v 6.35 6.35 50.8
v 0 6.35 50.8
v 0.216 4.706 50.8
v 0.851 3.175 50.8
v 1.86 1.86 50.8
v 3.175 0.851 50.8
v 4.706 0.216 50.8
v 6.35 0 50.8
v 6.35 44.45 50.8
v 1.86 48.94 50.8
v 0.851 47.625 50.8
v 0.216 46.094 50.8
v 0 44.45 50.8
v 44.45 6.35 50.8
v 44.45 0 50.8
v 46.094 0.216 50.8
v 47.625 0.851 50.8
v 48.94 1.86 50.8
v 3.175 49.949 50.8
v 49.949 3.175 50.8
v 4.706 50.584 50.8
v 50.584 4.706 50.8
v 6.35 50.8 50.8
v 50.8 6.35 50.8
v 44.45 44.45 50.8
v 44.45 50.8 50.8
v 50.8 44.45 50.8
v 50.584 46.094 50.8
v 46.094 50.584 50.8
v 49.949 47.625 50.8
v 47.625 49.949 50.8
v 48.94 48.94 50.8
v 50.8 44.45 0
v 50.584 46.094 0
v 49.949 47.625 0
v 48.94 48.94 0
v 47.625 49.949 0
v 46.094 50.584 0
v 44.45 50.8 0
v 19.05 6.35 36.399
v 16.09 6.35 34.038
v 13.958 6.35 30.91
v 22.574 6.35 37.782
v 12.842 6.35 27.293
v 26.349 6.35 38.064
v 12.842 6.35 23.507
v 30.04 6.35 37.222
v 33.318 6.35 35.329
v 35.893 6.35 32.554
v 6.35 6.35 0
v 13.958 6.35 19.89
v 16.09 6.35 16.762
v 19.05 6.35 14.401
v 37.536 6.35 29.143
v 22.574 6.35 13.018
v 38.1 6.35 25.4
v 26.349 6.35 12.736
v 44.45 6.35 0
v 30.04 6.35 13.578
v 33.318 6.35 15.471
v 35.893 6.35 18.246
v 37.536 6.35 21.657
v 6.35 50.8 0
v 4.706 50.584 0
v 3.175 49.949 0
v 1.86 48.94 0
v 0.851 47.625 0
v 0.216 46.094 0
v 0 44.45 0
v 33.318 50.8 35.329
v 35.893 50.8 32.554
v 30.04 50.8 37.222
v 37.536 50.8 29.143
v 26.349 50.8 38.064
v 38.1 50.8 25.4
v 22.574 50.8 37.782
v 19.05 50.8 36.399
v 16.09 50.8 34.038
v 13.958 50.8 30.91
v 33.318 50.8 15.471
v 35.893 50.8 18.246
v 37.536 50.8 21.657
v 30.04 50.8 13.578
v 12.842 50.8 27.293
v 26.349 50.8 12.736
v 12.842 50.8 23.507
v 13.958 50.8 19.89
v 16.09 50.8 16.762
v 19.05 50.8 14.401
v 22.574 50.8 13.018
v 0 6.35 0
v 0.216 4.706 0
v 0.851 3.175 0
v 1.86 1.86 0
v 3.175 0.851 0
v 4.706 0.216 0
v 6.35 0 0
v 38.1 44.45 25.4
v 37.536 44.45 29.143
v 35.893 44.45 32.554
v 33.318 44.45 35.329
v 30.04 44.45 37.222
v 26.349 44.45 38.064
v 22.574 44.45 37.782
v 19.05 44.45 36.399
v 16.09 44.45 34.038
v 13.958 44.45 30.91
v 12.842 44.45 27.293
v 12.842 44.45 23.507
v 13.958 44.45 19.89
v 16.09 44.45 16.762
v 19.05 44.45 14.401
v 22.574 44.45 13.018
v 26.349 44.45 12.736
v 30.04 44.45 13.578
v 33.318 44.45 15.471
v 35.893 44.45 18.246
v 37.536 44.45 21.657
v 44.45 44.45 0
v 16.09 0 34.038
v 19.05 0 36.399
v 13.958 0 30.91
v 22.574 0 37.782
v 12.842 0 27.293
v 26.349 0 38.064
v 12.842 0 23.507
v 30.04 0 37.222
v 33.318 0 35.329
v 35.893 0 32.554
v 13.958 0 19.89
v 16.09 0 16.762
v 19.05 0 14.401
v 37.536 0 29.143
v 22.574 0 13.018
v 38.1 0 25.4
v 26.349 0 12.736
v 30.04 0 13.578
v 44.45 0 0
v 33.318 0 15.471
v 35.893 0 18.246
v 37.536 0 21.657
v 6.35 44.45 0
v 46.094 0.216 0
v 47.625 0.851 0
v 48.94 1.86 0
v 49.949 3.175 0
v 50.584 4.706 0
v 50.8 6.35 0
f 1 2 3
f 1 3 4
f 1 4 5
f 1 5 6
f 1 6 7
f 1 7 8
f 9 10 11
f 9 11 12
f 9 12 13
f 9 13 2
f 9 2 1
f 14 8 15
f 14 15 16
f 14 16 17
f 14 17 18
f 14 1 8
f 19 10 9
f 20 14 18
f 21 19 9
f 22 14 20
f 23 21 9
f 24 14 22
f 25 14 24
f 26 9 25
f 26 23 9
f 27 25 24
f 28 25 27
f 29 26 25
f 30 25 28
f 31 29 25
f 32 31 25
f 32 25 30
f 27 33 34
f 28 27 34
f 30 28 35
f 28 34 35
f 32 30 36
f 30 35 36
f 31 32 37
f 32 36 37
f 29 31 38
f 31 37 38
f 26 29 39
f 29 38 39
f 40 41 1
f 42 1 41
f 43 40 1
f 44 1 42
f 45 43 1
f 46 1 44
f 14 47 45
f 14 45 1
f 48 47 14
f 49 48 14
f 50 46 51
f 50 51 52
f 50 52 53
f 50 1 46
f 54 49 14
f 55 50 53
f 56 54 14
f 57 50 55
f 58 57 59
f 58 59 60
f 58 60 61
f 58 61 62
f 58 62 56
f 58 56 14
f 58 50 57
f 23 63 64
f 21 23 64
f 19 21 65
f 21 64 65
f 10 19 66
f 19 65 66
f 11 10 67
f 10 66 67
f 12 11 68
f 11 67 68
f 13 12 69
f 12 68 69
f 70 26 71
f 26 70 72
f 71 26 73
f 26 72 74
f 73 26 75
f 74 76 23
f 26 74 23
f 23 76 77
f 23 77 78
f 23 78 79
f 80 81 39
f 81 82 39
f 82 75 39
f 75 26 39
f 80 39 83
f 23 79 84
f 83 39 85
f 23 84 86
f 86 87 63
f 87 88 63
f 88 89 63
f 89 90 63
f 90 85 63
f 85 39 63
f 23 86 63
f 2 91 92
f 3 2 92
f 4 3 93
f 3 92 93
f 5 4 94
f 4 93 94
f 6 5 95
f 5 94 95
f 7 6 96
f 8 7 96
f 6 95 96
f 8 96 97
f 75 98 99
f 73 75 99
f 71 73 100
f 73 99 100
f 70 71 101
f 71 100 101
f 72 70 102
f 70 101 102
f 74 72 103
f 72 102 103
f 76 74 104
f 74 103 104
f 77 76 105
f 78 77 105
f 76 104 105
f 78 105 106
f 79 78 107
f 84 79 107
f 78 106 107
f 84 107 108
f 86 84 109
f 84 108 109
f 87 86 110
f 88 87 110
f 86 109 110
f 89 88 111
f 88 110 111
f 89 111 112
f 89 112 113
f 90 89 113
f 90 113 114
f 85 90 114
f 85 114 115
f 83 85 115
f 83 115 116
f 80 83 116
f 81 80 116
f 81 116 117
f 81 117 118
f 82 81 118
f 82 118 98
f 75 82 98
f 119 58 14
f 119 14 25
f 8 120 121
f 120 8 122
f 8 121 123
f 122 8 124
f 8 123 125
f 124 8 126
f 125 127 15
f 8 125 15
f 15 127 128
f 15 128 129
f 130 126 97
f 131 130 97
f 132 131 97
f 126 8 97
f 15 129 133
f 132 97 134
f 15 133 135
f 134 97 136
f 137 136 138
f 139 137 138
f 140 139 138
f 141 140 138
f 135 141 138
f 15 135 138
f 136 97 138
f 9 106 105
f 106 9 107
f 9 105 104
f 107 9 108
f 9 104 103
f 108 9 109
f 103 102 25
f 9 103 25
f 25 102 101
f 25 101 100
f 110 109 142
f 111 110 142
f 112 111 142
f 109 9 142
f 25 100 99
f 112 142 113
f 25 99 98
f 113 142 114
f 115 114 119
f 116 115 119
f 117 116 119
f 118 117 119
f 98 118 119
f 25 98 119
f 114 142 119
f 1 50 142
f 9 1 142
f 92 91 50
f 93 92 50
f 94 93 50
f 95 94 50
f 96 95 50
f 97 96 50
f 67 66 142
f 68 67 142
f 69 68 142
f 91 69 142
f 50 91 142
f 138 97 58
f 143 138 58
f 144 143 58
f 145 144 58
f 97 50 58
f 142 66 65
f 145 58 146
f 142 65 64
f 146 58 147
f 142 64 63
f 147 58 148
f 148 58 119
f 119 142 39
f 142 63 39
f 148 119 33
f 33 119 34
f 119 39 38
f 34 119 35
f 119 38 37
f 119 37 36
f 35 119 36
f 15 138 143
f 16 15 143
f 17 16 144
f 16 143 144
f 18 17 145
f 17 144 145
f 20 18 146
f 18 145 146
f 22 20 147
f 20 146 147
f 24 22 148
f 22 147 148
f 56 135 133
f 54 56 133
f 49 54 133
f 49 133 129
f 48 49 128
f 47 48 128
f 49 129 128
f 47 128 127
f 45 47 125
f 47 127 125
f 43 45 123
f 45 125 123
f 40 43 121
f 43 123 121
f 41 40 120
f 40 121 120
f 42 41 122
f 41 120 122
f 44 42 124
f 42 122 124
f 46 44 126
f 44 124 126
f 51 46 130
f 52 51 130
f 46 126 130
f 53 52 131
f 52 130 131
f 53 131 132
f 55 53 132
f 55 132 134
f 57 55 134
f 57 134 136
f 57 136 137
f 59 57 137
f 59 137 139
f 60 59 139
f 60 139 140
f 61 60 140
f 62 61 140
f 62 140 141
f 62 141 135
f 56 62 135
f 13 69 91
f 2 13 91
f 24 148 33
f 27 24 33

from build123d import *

# Parameters (mm, degrees)
F0_W     = 38.1
F0_H     = 38.1
F1_DEPTH = 50.8
F2_R     = 12.7
F3_DEPTH = 50.801


with BuildPart() as f1:
    # F0 (on Top) → F1 (new body)
    with BuildSketch(Plane.XY):
        with BuildLine():
            ThreePointArc((0, 6.35), (1.859872, 1.859872), (6.35, 0))
            Line((6.35, 0), (44.45, 0))
            ThreePointArc((44.45, 0), (48.940128, 1.859872), (50.8, 6.35))
            Line((50.8, 6.35), (50.8, 44.45))
            ThreePointArc((50.8, 44.45), (48.940128, 48.940128), (44.45, 50.8))
            Line((44.45, 50.8), (6.35, 50.8))
            ThreePointArc((6.35, 50.8), (1.859872, 48.940128), (0, 44.45))
            Line((0, 44.45), (0, 6.35))
        make_face()
        with Locations((25.4, 25.4)):
            Rectangle(F0_W, F0_H, mode=Mode.SUBTRACT)
    extrude(amount=F1_DEPTH)

    # F2 (on face) → F3 (cut, through all)
    with BuildSketch(Plane.XZ):
        with Locations((25.4, 25.4)):
            Circle(F2_R)
    extrude(amount=-F3_DEPTH, mode=Mode.SUBTRACT)


solid = f1.part
